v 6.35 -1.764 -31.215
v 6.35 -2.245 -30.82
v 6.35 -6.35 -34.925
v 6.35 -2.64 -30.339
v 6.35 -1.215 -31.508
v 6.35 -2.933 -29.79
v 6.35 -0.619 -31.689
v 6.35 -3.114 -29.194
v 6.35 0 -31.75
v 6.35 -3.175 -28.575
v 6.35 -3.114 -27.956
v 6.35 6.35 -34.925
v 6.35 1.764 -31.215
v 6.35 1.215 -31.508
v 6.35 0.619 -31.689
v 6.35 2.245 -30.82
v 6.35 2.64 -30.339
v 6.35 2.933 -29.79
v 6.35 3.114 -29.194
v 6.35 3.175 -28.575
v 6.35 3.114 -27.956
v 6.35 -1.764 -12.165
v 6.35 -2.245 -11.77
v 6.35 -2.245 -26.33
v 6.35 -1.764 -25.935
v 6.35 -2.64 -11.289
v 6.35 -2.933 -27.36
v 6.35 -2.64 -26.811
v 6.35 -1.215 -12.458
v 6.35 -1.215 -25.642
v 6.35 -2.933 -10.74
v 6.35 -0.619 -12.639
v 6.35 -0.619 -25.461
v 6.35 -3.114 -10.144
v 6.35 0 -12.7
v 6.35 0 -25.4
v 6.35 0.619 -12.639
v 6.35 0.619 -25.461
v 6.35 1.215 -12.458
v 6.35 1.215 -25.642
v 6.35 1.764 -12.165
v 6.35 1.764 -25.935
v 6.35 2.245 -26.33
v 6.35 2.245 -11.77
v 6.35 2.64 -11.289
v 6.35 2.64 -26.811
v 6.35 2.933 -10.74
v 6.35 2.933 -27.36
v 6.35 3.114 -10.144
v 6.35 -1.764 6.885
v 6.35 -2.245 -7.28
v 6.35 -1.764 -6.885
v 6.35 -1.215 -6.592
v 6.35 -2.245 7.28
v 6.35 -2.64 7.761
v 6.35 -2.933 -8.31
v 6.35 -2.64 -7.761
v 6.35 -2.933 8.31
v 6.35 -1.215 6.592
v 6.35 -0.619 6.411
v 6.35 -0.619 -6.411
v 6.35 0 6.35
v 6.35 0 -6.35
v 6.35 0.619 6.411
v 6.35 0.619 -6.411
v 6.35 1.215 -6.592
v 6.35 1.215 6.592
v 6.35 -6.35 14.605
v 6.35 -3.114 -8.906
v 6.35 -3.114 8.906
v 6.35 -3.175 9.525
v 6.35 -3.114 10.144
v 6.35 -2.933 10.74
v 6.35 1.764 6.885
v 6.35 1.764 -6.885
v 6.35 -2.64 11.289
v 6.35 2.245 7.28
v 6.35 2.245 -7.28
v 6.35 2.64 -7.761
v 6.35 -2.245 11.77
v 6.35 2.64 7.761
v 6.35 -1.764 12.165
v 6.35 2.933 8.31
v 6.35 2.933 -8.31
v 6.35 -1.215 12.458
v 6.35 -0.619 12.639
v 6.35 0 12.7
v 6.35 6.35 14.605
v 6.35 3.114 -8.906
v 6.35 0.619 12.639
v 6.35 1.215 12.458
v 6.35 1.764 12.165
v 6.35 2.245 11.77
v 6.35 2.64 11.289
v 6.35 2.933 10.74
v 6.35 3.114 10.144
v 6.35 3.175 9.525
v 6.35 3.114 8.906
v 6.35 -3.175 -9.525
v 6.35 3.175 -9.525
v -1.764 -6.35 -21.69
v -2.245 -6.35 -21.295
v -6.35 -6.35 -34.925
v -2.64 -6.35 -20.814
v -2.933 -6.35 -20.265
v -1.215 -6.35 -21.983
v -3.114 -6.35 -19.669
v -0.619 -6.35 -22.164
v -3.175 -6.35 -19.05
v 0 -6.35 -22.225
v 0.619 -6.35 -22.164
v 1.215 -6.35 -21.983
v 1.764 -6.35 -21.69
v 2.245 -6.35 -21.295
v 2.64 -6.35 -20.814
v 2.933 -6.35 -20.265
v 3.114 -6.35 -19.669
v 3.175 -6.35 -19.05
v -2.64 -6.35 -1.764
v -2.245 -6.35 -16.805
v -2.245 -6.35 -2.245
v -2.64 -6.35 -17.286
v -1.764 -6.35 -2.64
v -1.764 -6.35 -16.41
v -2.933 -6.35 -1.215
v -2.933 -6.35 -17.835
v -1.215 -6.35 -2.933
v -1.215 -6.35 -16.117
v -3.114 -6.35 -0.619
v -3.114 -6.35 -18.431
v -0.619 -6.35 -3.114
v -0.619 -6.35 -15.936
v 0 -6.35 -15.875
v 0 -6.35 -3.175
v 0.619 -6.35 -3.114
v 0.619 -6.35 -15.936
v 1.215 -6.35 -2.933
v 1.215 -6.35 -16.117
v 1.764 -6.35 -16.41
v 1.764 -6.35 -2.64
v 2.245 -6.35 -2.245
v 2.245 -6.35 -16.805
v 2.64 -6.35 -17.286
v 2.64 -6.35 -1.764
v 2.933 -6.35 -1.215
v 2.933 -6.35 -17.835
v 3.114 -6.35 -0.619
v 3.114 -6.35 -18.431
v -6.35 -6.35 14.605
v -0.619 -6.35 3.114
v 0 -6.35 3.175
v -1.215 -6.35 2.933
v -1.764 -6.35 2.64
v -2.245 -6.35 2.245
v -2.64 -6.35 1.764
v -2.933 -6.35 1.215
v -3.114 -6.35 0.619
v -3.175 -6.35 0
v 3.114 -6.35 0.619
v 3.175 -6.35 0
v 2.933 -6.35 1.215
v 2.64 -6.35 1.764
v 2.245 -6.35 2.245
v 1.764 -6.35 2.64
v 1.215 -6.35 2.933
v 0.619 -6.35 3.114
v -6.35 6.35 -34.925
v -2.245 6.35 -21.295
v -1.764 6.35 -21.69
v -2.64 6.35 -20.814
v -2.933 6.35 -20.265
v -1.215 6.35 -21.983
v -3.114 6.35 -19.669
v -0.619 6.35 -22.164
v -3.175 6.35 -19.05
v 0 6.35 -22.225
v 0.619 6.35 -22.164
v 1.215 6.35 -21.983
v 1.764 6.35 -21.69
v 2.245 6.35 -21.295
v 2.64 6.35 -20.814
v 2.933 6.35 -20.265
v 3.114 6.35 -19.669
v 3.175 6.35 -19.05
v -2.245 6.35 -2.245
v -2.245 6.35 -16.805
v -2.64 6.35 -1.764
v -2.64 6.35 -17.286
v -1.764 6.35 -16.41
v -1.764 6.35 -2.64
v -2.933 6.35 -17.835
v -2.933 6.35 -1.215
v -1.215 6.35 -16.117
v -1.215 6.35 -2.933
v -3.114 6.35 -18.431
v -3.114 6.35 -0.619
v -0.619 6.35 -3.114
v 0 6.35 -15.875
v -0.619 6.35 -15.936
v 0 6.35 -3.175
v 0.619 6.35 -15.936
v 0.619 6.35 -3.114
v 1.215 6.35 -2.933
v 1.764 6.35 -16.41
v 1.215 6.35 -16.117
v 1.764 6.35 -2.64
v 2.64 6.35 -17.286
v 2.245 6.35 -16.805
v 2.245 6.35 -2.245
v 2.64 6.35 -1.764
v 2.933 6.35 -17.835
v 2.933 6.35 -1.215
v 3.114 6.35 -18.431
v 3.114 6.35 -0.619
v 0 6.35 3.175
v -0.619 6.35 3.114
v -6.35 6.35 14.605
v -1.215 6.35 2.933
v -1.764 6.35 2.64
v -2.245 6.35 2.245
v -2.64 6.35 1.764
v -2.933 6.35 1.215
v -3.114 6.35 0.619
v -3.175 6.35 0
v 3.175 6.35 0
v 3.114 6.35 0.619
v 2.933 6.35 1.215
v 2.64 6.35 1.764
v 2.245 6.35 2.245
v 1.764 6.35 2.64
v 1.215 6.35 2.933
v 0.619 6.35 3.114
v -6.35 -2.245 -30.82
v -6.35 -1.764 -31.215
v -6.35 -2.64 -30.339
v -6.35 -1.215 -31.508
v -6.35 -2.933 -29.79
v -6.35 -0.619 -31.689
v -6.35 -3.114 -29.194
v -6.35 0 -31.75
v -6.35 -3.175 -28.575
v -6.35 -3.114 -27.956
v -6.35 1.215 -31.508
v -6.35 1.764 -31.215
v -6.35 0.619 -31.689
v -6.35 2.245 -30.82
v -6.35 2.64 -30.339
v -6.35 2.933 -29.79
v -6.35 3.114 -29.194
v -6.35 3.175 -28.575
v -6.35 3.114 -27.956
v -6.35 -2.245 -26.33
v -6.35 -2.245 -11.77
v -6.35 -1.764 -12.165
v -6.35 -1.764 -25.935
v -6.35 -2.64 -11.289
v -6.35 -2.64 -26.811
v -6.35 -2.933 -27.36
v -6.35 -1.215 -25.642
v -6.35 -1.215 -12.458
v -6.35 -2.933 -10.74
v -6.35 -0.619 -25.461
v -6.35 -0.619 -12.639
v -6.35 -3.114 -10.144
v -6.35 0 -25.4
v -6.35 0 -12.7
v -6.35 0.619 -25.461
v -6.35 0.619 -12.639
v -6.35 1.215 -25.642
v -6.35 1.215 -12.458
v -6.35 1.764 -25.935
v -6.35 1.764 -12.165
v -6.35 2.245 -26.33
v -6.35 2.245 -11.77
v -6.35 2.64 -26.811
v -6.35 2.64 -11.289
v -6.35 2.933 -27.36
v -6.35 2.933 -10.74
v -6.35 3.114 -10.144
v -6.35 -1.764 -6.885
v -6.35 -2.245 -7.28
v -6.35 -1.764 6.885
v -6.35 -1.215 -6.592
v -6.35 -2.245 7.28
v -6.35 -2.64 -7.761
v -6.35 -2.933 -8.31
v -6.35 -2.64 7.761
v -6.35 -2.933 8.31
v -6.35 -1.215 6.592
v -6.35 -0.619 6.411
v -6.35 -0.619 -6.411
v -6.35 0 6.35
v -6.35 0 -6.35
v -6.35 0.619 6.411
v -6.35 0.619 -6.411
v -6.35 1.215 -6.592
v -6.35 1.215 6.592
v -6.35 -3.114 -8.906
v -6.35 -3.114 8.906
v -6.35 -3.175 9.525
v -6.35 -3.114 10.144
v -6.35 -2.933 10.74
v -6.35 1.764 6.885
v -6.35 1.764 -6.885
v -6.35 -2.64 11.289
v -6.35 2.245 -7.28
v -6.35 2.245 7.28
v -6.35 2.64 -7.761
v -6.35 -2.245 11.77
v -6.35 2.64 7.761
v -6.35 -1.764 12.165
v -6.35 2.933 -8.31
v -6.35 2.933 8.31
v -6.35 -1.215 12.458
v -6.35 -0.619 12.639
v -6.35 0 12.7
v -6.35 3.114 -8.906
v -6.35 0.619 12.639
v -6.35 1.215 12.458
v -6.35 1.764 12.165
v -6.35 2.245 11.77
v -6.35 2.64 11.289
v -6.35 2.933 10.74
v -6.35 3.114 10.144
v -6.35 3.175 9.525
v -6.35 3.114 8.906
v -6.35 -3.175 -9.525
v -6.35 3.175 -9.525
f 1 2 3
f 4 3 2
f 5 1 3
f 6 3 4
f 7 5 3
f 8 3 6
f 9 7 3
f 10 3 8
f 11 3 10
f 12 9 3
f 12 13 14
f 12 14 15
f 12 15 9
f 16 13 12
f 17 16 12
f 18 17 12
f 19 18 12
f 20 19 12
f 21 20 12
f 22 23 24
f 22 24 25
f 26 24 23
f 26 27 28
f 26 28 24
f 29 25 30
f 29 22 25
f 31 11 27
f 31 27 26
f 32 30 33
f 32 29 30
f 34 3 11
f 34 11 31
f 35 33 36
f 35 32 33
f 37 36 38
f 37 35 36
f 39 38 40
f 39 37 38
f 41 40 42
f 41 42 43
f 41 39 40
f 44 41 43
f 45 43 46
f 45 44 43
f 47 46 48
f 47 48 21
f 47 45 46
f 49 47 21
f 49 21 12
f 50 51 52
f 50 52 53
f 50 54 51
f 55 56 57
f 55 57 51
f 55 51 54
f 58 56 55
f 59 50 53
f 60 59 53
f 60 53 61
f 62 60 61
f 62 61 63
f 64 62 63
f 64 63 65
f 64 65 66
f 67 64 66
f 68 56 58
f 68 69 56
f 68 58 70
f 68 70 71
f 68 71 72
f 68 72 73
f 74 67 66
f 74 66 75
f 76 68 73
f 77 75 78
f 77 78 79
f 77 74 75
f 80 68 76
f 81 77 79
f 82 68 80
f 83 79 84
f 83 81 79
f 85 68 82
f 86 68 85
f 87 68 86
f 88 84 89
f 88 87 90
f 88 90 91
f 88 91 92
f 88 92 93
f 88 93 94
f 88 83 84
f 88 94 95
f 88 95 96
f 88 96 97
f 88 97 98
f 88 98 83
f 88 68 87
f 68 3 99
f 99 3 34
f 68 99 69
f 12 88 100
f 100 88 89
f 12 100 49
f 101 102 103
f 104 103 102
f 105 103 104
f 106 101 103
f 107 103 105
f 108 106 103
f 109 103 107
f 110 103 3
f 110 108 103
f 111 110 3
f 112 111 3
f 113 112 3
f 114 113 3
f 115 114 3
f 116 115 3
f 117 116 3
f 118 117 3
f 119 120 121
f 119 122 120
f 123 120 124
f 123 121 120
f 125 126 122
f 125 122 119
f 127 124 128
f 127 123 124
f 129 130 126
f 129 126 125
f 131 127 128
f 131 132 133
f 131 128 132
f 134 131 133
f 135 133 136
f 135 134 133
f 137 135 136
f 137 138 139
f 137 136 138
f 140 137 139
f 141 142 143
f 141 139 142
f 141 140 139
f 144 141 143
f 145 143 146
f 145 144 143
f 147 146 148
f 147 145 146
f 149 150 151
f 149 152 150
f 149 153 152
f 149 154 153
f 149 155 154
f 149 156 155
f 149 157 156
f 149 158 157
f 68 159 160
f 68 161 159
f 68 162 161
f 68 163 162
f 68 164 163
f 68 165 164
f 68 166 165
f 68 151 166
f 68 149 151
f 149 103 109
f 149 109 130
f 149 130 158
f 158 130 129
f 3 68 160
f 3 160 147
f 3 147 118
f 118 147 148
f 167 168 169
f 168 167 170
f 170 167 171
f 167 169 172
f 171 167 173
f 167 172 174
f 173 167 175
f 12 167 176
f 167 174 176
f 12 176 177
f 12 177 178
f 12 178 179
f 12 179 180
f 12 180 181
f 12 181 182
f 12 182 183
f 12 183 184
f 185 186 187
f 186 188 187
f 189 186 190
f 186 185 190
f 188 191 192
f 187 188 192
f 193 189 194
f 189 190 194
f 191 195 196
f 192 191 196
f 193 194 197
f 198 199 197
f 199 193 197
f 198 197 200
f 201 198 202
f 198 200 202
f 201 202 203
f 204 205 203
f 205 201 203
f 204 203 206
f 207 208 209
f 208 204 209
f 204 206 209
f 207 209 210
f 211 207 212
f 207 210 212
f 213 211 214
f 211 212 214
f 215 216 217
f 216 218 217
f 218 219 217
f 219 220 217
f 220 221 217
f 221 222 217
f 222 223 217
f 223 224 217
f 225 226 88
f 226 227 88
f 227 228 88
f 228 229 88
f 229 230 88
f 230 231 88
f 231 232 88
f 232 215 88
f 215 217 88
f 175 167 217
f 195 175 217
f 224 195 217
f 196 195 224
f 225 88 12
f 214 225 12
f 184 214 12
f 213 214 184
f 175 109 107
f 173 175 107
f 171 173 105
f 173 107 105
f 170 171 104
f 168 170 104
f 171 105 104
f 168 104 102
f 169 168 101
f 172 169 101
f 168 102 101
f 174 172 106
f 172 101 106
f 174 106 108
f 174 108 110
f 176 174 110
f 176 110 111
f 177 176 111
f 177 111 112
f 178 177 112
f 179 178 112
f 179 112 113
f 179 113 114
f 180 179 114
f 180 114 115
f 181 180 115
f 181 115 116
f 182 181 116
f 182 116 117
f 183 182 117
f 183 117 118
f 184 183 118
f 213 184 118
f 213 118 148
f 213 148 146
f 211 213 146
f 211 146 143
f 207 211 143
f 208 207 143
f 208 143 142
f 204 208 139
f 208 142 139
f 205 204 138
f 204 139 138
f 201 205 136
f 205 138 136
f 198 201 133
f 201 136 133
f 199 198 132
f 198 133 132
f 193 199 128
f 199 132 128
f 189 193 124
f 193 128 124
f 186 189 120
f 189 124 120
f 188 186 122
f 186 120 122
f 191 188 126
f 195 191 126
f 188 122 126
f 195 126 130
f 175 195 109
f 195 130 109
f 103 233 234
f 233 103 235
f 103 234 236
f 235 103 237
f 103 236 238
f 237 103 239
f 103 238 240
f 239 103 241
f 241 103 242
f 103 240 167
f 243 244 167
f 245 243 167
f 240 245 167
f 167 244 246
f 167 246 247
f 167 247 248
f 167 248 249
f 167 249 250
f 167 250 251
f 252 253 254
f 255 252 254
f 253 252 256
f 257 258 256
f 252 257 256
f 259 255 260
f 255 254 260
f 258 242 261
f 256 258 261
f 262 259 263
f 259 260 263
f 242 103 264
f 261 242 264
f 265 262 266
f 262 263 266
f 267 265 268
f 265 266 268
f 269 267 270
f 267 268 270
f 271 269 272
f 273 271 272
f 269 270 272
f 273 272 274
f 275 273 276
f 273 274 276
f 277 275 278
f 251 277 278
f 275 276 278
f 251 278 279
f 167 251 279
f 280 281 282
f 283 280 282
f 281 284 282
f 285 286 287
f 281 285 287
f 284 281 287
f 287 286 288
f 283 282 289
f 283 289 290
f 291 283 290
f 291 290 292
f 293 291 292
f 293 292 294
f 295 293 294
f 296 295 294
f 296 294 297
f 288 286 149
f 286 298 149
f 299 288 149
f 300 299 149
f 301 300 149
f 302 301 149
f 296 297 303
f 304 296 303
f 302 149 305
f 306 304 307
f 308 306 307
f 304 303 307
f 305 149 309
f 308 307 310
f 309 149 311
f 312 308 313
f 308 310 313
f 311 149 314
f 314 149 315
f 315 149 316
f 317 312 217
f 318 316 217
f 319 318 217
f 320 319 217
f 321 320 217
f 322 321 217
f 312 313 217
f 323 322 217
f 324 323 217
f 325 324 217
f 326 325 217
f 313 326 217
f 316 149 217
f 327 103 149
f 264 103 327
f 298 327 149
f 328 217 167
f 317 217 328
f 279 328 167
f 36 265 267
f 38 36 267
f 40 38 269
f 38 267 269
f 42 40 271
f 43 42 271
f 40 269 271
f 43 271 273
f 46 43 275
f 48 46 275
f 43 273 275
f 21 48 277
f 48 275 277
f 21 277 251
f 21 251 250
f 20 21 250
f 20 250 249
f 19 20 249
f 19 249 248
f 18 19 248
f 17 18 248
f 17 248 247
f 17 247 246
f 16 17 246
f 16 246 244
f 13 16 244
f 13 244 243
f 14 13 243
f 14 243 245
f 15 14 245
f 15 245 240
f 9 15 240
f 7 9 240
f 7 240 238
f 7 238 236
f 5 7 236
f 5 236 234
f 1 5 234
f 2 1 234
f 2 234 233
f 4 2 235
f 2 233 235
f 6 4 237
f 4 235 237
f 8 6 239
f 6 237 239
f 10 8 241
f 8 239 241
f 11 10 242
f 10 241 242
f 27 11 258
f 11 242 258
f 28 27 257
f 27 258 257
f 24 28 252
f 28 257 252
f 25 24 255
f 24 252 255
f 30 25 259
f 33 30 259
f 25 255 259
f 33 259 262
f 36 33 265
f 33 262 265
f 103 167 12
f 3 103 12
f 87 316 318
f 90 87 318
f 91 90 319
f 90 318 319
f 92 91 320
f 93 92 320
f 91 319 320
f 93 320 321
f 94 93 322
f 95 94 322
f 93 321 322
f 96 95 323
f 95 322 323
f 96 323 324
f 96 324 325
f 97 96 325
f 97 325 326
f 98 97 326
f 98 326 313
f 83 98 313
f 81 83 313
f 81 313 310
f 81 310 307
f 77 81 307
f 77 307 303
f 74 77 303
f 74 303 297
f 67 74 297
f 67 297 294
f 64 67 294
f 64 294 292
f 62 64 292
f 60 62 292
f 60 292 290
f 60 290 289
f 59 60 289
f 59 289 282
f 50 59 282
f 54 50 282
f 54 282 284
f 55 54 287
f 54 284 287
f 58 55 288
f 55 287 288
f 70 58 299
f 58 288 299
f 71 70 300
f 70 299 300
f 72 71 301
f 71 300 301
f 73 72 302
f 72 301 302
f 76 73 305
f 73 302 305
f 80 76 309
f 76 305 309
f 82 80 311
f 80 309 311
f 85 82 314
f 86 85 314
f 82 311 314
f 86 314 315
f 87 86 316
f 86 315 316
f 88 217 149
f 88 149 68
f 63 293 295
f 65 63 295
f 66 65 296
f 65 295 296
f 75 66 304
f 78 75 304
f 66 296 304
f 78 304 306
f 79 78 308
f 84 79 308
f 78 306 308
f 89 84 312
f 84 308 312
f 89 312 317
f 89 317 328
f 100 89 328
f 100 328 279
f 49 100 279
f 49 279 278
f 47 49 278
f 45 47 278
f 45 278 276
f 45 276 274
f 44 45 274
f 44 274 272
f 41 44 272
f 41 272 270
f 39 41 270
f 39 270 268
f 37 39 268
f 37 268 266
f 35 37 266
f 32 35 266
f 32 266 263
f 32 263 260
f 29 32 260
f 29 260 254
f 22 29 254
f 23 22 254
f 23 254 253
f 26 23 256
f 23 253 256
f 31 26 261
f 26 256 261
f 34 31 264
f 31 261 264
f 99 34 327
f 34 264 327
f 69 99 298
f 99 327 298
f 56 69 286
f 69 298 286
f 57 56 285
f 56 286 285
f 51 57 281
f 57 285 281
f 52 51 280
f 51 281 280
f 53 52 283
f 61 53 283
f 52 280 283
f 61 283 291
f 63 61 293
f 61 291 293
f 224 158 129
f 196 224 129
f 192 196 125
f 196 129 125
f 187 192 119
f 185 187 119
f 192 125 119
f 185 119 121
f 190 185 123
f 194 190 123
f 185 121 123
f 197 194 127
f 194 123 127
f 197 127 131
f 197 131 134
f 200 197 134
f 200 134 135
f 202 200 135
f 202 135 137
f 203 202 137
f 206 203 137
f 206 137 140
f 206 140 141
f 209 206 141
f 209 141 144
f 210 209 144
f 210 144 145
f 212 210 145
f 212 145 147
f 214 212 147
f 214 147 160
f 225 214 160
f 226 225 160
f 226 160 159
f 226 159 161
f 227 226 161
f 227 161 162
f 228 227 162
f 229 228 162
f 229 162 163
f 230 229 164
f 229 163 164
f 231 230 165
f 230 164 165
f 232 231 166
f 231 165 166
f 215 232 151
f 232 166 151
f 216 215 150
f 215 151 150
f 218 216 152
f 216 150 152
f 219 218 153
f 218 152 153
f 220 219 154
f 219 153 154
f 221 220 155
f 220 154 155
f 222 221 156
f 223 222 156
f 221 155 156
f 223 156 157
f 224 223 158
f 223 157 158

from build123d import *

# Parameters (mm, degrees)
SKETCH1_W               = 12.7
SKETCH1_H               = 12.7
BOSS_EXTRUDE1_DEPTH     = 34.925
F_1_4_20_TAPPED_HOLE1_D = 6.35
F_1_4_20_TAPPED_HOLE2_D = 6.35
SKETCH6_W               = 12.7
SKETCH6_H               = 20.32
CUT_EXTRUDE1_DEPTH      = 13.7


with BuildPart() as part:
    # Sketch1 → Boss-Extrude1 (new body, symmetric)
    with BuildSketch(Plane.XY):
        Rectangle(SKETCH1_W, SKETCH1_H)
    extrude(amount=BOSS_EXTRUDE1_DEPTH, both=True)

    # 1/4-20 Tapped Hole1 (through all)
    with Locations(Plane(origin=(0, 6.35, 0), x_dir=(1, 0, 0), z_dir=(0, 1, 0))):
        with Locations((0, 0), (0, 19.05), (0, -19.05)):
            Hole(F_1_4_20_TAPPED_HOLE1_D / 2)

    # 1/4-20 Tapped Hole2 (through all)
    with Locations(Plane(origin=(6.35, 0, 0), x_dir=(0, 0, -1), z_dir=(1, 0, 0))):
        with Locations((9.525, 0), (28.575, 0), (-9.525, 0), (-28.575, 0)):
            Hole(F_1_4_20_TAPPED_HOLE2_D / 2)

    # Sketch6 → Cut-Extrude1 (cut, through all)
    with BuildSketch(Plane(origin=(0, 6.35, 0), x_dir=(1, 0, 0), z_dir=(0, 1, 0))):
        with Locations((0, -24.765)):
            Rectangle(SKETCH6_W, SKETCH6_H)
    extrude(amount=-CUT_EXTRUDE1_DEPTH, mode=Mode.SUBTRACT)


solid = part.part
